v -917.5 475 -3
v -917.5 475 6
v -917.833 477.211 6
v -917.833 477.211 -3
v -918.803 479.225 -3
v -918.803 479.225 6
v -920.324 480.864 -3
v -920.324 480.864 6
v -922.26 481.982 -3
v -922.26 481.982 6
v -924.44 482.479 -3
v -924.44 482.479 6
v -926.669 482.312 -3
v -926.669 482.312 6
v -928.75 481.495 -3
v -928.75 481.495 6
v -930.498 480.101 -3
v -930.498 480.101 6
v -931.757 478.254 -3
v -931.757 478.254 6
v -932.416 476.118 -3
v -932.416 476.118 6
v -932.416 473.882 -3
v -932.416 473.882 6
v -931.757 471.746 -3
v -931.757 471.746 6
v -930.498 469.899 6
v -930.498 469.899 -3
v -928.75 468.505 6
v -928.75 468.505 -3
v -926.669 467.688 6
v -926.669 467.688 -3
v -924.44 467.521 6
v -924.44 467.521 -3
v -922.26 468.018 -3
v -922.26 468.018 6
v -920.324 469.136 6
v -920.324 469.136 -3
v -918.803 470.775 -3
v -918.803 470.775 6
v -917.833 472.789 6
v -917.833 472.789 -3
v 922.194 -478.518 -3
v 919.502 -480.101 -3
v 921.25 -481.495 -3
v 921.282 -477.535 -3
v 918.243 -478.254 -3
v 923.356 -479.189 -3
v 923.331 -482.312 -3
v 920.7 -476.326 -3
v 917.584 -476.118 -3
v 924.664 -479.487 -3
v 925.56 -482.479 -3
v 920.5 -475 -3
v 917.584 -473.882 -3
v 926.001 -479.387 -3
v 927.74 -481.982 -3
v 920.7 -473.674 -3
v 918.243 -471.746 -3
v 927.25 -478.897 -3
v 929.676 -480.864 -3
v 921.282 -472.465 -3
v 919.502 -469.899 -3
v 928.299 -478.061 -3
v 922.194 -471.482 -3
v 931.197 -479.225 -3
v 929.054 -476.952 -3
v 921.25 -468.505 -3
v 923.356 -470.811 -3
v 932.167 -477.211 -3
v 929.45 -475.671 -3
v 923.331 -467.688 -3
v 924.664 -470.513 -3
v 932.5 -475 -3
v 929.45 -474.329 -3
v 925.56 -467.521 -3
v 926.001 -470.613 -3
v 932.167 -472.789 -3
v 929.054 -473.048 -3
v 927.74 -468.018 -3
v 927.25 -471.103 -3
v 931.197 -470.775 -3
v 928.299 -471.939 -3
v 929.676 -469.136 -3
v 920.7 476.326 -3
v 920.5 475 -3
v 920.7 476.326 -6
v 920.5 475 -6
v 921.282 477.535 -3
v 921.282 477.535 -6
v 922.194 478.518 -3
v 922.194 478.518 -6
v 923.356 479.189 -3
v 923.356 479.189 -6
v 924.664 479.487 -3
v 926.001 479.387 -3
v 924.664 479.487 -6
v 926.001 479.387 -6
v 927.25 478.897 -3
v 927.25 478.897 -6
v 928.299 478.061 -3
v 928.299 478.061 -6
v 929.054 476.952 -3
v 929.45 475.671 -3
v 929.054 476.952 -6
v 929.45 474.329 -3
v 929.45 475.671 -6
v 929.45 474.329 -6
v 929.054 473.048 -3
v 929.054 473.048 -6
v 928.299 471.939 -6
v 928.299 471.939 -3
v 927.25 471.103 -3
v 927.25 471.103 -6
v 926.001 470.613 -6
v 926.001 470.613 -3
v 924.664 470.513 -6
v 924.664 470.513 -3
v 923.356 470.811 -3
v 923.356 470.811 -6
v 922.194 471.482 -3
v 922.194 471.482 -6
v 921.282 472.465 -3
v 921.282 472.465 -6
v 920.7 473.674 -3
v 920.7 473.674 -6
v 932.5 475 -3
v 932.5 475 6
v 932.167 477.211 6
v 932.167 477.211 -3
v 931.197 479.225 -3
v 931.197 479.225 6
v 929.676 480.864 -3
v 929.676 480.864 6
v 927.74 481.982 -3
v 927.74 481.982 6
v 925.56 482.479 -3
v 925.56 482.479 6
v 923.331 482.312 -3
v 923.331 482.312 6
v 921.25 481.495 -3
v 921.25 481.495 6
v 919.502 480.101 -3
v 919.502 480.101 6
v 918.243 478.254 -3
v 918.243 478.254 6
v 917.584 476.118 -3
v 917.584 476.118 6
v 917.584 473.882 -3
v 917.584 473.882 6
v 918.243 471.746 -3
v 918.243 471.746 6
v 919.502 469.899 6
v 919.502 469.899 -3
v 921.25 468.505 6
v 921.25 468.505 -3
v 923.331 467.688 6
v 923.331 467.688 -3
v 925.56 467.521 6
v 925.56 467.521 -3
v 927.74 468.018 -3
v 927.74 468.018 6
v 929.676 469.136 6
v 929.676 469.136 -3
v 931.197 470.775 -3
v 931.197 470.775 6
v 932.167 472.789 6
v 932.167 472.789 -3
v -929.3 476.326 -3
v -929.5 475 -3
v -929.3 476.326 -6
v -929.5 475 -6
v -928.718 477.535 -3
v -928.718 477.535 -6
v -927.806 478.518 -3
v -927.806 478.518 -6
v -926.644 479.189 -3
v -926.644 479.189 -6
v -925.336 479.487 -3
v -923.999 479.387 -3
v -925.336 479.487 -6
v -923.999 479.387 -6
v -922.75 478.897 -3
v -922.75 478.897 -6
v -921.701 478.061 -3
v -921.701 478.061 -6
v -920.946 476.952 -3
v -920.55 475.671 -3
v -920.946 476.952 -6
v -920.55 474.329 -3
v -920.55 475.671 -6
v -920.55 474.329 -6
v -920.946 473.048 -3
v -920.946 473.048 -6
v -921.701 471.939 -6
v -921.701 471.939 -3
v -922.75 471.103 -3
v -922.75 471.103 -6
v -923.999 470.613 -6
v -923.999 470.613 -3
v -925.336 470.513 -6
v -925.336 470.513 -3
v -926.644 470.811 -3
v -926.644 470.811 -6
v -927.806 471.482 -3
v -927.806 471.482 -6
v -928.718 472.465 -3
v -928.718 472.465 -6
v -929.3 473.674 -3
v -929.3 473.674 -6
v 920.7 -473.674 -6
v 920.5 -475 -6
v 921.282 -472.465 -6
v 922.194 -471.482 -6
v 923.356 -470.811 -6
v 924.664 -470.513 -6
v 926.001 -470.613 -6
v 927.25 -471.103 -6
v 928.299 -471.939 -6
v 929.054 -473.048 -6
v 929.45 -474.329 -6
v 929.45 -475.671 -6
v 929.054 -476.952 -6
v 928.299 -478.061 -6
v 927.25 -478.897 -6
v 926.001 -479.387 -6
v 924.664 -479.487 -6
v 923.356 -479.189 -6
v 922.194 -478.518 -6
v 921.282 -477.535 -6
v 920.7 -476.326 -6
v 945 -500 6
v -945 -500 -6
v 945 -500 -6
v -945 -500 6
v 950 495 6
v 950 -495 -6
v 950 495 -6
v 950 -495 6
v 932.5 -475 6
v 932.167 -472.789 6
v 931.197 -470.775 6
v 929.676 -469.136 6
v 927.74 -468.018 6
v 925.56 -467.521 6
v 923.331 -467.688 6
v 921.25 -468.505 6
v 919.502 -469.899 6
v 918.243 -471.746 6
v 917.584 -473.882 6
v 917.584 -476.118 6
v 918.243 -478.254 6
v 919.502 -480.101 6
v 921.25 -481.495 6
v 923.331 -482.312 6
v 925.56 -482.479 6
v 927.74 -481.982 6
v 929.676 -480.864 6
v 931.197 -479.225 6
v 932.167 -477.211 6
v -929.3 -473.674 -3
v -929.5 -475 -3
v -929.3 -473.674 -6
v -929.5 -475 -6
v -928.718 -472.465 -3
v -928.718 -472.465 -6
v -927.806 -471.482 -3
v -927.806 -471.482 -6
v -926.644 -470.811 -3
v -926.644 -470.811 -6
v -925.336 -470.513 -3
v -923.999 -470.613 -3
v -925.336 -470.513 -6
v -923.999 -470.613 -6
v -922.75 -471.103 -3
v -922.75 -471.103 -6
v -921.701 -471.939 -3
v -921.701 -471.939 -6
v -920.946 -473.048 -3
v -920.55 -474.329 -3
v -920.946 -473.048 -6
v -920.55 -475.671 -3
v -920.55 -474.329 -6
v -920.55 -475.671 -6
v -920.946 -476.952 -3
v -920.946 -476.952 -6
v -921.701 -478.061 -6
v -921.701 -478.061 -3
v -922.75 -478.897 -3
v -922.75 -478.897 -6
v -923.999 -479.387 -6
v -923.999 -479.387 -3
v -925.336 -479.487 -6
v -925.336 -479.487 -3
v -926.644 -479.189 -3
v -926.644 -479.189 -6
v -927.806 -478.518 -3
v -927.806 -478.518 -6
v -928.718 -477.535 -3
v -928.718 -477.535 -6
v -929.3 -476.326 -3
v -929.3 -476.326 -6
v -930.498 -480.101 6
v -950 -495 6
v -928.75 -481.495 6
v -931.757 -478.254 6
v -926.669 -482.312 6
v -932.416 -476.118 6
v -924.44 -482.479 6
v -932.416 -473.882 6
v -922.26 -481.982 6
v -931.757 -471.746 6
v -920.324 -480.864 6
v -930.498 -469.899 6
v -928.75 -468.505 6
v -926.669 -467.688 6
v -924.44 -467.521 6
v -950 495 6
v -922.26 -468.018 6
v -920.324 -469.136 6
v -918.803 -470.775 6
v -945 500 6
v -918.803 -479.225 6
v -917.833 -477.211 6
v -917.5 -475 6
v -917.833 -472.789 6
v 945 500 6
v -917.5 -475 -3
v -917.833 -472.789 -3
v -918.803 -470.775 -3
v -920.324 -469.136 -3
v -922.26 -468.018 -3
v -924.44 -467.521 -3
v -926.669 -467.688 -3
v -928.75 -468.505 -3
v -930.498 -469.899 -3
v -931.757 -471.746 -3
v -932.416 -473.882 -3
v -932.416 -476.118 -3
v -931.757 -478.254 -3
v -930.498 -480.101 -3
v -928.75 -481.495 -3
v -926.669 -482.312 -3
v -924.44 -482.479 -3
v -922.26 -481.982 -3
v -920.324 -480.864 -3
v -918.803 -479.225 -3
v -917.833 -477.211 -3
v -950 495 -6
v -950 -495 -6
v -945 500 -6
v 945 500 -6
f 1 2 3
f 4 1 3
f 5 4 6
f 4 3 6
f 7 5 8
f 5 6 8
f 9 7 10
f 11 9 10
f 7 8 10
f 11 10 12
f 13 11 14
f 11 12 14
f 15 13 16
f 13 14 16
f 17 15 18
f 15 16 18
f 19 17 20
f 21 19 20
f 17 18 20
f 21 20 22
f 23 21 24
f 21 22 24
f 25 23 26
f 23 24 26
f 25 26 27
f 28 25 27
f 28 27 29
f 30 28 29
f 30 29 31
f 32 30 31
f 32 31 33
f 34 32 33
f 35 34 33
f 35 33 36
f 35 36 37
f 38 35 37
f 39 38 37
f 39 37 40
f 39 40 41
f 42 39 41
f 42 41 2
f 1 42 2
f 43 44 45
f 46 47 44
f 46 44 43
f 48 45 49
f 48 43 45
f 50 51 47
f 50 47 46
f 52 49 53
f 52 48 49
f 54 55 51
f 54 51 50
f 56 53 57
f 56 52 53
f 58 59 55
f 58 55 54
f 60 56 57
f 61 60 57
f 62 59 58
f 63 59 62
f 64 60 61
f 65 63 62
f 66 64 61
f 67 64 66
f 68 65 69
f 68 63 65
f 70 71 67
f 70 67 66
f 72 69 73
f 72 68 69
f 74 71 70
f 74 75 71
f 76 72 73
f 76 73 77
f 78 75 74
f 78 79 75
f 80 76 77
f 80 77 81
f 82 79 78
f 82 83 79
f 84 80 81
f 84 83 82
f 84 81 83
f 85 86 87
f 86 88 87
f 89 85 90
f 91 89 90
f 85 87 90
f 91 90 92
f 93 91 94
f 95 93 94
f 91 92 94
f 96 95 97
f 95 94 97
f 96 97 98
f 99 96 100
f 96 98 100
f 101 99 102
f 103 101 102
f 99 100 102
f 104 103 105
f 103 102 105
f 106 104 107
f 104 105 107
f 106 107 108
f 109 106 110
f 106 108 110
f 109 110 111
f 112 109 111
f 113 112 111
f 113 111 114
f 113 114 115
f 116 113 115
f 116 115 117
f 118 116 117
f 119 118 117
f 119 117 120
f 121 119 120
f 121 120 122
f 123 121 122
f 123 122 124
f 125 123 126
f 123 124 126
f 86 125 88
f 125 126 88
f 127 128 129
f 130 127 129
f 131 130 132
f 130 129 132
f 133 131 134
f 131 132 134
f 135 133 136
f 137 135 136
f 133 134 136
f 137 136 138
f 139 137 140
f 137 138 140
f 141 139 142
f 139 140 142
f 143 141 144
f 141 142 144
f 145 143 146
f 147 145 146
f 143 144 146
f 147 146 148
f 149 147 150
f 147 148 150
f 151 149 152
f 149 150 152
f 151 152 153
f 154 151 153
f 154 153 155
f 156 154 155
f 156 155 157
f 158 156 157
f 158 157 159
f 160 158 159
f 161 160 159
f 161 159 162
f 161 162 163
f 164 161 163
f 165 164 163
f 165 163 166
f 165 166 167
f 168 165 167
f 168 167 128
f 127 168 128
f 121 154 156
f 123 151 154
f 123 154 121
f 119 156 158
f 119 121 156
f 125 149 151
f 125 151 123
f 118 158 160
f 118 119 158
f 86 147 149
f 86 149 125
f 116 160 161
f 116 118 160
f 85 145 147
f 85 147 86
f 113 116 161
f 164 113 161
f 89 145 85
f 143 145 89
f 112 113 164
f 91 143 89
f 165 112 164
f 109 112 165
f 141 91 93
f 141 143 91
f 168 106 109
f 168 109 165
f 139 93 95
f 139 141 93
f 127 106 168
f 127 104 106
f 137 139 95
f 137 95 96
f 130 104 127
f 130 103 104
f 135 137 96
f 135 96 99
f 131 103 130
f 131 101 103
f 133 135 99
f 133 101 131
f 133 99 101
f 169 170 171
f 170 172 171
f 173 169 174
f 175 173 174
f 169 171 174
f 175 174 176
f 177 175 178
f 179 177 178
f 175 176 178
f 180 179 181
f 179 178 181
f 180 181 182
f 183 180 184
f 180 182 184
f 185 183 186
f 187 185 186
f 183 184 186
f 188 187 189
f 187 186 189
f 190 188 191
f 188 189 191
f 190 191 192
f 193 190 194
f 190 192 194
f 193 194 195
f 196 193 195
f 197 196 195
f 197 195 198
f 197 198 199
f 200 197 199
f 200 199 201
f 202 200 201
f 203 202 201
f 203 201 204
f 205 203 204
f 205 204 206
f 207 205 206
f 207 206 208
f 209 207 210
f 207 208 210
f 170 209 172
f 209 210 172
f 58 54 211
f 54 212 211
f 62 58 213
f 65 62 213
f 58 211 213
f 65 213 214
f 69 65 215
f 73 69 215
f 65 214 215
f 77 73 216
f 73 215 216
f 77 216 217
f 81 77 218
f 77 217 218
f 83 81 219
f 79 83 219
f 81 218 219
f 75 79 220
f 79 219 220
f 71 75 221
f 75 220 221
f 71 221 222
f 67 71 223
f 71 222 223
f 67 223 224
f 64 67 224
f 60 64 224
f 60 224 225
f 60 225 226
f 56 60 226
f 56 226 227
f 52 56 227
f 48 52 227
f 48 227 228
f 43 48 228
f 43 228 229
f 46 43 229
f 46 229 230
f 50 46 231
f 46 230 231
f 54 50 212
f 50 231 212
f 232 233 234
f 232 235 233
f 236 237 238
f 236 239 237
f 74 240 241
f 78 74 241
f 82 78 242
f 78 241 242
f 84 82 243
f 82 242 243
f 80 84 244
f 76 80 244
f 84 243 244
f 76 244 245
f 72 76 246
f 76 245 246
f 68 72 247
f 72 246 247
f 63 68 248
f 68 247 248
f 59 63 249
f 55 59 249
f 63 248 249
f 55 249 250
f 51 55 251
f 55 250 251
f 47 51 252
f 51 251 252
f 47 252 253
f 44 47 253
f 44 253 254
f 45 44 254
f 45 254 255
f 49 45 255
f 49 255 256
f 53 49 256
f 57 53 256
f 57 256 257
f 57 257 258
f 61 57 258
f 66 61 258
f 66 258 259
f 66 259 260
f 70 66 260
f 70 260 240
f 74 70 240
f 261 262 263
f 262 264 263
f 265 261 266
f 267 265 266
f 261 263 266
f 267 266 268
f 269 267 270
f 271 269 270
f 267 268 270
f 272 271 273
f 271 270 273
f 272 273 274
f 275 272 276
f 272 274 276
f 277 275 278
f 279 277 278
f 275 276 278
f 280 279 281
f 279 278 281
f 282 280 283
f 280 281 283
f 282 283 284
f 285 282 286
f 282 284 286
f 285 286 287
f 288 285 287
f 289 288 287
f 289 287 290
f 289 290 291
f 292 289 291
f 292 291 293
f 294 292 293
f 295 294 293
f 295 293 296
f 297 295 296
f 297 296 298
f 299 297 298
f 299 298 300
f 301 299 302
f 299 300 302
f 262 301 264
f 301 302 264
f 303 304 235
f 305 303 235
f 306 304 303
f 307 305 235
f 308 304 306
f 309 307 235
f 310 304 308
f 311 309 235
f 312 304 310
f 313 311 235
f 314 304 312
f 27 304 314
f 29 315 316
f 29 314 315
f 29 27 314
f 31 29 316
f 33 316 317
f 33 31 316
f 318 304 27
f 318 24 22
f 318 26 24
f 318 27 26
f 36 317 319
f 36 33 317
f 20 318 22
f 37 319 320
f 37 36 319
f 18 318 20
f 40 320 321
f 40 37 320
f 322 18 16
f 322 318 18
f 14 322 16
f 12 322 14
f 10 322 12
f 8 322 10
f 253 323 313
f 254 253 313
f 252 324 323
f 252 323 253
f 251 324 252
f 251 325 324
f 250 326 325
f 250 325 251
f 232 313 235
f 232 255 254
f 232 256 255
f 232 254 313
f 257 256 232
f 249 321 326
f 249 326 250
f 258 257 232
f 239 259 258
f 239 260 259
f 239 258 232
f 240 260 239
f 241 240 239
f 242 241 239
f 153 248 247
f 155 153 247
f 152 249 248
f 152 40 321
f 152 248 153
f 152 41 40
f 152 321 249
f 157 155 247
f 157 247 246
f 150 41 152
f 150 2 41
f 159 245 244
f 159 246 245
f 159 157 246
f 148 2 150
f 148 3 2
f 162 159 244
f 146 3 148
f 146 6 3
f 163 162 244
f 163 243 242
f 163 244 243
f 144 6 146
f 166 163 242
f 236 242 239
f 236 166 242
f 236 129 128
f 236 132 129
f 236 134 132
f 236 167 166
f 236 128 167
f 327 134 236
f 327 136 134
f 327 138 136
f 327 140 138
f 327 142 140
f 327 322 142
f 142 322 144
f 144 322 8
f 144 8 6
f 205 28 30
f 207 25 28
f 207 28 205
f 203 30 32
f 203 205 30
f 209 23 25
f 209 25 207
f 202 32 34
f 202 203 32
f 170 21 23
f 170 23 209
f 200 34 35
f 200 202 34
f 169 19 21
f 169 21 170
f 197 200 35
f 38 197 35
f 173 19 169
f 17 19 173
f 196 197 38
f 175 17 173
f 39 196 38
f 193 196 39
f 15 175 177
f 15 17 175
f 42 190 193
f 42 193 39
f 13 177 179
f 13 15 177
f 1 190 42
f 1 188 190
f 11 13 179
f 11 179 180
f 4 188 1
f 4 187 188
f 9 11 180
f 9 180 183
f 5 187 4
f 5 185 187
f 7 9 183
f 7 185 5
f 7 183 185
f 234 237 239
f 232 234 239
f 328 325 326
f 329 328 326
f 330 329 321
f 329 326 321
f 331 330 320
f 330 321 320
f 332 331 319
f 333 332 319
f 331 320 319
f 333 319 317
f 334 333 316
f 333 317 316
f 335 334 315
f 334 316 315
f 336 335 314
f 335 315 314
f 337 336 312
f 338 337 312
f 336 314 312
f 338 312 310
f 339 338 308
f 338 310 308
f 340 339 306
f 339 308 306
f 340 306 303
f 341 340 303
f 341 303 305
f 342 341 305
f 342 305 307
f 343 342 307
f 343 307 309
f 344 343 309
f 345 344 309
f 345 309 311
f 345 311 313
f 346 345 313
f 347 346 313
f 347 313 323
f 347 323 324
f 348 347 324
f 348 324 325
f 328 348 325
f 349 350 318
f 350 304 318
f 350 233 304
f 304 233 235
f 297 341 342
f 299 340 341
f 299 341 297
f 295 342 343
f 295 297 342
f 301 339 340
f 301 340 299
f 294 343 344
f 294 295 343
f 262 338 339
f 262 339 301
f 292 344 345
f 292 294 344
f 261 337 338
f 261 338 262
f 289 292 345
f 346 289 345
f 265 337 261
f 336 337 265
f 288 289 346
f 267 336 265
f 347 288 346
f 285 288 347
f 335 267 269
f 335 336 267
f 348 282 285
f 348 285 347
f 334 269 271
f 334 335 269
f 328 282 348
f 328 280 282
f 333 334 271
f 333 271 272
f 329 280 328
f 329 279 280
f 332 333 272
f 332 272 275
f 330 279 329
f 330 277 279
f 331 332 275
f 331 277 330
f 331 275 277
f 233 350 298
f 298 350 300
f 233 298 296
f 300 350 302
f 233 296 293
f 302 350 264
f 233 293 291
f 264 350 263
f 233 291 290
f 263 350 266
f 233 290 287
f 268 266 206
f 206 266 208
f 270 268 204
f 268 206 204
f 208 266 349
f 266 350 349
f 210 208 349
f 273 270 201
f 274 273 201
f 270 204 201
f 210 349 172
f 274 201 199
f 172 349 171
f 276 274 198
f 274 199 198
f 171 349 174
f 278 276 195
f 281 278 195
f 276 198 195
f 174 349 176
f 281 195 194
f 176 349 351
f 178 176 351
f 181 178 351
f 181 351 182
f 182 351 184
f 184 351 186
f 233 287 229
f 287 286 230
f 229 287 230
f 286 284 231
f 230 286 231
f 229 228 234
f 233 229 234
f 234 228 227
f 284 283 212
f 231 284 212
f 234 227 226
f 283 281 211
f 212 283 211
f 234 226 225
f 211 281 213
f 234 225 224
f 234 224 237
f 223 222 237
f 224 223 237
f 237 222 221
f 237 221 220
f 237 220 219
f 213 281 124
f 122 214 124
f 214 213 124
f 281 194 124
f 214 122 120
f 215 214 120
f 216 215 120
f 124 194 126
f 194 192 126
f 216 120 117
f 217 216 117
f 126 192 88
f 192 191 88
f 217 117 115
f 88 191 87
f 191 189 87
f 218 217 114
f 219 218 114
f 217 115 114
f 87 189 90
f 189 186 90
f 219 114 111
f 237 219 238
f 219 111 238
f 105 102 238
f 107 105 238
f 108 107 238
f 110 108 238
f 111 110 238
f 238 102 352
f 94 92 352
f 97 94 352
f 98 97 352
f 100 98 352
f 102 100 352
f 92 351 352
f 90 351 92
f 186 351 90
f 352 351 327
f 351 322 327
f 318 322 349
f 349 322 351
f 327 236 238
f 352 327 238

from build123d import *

# Parameters (mm, degrees)
SKETCH_1_W                = 1900
SKETCH_1_H                = 1000
EXTRUDE_1_DEPTH           = 6
HOLE_WIZARD_1_D           = 9
HOLE_WIZARD_1_CBORE_D     = 15
HOLE_WIZARD_1_CBORE_DEPTH = 9
CHAMFER_1_SIZE            = 5


with BuildPart() as part:
    # 草图1 → 凸台-拉伸1 (new body, symmetric)
    with BuildSketch(Plane.XY):
        Rectangle(SKETCH_1_W, SKETCH_1_H)
    extrude(amount=EXTRUDE_1_DEPTH, both=True)

    # 打孔尺寸(%根据)内六角圆柱头螺钉的类型1 (through all)
    with Locations(Plane.XY.offset(6)):
        with Locations((925, 475), (925, -475), (-925, -475), (-925, 475)):
            CounterBoreHole(HOLE_WIZARD_1_D / 2, HOLE_WIZARD_1_CBORE_D / 2, HOLE_WIZARD_1_CBORE_DEPTH)

    # 倒角1
    chamfer_1_edges = [part.edges().sort_by_distance(p)[0] for p in [
        (-950, 500, 0),
        (950, 500, 0),
        (950, -500, 0),
        (-950, -500, 0),
    ]]
    chamfer(chamfer_1_edges, length=CHAMFER_1_SIZE)


solid = part.part
